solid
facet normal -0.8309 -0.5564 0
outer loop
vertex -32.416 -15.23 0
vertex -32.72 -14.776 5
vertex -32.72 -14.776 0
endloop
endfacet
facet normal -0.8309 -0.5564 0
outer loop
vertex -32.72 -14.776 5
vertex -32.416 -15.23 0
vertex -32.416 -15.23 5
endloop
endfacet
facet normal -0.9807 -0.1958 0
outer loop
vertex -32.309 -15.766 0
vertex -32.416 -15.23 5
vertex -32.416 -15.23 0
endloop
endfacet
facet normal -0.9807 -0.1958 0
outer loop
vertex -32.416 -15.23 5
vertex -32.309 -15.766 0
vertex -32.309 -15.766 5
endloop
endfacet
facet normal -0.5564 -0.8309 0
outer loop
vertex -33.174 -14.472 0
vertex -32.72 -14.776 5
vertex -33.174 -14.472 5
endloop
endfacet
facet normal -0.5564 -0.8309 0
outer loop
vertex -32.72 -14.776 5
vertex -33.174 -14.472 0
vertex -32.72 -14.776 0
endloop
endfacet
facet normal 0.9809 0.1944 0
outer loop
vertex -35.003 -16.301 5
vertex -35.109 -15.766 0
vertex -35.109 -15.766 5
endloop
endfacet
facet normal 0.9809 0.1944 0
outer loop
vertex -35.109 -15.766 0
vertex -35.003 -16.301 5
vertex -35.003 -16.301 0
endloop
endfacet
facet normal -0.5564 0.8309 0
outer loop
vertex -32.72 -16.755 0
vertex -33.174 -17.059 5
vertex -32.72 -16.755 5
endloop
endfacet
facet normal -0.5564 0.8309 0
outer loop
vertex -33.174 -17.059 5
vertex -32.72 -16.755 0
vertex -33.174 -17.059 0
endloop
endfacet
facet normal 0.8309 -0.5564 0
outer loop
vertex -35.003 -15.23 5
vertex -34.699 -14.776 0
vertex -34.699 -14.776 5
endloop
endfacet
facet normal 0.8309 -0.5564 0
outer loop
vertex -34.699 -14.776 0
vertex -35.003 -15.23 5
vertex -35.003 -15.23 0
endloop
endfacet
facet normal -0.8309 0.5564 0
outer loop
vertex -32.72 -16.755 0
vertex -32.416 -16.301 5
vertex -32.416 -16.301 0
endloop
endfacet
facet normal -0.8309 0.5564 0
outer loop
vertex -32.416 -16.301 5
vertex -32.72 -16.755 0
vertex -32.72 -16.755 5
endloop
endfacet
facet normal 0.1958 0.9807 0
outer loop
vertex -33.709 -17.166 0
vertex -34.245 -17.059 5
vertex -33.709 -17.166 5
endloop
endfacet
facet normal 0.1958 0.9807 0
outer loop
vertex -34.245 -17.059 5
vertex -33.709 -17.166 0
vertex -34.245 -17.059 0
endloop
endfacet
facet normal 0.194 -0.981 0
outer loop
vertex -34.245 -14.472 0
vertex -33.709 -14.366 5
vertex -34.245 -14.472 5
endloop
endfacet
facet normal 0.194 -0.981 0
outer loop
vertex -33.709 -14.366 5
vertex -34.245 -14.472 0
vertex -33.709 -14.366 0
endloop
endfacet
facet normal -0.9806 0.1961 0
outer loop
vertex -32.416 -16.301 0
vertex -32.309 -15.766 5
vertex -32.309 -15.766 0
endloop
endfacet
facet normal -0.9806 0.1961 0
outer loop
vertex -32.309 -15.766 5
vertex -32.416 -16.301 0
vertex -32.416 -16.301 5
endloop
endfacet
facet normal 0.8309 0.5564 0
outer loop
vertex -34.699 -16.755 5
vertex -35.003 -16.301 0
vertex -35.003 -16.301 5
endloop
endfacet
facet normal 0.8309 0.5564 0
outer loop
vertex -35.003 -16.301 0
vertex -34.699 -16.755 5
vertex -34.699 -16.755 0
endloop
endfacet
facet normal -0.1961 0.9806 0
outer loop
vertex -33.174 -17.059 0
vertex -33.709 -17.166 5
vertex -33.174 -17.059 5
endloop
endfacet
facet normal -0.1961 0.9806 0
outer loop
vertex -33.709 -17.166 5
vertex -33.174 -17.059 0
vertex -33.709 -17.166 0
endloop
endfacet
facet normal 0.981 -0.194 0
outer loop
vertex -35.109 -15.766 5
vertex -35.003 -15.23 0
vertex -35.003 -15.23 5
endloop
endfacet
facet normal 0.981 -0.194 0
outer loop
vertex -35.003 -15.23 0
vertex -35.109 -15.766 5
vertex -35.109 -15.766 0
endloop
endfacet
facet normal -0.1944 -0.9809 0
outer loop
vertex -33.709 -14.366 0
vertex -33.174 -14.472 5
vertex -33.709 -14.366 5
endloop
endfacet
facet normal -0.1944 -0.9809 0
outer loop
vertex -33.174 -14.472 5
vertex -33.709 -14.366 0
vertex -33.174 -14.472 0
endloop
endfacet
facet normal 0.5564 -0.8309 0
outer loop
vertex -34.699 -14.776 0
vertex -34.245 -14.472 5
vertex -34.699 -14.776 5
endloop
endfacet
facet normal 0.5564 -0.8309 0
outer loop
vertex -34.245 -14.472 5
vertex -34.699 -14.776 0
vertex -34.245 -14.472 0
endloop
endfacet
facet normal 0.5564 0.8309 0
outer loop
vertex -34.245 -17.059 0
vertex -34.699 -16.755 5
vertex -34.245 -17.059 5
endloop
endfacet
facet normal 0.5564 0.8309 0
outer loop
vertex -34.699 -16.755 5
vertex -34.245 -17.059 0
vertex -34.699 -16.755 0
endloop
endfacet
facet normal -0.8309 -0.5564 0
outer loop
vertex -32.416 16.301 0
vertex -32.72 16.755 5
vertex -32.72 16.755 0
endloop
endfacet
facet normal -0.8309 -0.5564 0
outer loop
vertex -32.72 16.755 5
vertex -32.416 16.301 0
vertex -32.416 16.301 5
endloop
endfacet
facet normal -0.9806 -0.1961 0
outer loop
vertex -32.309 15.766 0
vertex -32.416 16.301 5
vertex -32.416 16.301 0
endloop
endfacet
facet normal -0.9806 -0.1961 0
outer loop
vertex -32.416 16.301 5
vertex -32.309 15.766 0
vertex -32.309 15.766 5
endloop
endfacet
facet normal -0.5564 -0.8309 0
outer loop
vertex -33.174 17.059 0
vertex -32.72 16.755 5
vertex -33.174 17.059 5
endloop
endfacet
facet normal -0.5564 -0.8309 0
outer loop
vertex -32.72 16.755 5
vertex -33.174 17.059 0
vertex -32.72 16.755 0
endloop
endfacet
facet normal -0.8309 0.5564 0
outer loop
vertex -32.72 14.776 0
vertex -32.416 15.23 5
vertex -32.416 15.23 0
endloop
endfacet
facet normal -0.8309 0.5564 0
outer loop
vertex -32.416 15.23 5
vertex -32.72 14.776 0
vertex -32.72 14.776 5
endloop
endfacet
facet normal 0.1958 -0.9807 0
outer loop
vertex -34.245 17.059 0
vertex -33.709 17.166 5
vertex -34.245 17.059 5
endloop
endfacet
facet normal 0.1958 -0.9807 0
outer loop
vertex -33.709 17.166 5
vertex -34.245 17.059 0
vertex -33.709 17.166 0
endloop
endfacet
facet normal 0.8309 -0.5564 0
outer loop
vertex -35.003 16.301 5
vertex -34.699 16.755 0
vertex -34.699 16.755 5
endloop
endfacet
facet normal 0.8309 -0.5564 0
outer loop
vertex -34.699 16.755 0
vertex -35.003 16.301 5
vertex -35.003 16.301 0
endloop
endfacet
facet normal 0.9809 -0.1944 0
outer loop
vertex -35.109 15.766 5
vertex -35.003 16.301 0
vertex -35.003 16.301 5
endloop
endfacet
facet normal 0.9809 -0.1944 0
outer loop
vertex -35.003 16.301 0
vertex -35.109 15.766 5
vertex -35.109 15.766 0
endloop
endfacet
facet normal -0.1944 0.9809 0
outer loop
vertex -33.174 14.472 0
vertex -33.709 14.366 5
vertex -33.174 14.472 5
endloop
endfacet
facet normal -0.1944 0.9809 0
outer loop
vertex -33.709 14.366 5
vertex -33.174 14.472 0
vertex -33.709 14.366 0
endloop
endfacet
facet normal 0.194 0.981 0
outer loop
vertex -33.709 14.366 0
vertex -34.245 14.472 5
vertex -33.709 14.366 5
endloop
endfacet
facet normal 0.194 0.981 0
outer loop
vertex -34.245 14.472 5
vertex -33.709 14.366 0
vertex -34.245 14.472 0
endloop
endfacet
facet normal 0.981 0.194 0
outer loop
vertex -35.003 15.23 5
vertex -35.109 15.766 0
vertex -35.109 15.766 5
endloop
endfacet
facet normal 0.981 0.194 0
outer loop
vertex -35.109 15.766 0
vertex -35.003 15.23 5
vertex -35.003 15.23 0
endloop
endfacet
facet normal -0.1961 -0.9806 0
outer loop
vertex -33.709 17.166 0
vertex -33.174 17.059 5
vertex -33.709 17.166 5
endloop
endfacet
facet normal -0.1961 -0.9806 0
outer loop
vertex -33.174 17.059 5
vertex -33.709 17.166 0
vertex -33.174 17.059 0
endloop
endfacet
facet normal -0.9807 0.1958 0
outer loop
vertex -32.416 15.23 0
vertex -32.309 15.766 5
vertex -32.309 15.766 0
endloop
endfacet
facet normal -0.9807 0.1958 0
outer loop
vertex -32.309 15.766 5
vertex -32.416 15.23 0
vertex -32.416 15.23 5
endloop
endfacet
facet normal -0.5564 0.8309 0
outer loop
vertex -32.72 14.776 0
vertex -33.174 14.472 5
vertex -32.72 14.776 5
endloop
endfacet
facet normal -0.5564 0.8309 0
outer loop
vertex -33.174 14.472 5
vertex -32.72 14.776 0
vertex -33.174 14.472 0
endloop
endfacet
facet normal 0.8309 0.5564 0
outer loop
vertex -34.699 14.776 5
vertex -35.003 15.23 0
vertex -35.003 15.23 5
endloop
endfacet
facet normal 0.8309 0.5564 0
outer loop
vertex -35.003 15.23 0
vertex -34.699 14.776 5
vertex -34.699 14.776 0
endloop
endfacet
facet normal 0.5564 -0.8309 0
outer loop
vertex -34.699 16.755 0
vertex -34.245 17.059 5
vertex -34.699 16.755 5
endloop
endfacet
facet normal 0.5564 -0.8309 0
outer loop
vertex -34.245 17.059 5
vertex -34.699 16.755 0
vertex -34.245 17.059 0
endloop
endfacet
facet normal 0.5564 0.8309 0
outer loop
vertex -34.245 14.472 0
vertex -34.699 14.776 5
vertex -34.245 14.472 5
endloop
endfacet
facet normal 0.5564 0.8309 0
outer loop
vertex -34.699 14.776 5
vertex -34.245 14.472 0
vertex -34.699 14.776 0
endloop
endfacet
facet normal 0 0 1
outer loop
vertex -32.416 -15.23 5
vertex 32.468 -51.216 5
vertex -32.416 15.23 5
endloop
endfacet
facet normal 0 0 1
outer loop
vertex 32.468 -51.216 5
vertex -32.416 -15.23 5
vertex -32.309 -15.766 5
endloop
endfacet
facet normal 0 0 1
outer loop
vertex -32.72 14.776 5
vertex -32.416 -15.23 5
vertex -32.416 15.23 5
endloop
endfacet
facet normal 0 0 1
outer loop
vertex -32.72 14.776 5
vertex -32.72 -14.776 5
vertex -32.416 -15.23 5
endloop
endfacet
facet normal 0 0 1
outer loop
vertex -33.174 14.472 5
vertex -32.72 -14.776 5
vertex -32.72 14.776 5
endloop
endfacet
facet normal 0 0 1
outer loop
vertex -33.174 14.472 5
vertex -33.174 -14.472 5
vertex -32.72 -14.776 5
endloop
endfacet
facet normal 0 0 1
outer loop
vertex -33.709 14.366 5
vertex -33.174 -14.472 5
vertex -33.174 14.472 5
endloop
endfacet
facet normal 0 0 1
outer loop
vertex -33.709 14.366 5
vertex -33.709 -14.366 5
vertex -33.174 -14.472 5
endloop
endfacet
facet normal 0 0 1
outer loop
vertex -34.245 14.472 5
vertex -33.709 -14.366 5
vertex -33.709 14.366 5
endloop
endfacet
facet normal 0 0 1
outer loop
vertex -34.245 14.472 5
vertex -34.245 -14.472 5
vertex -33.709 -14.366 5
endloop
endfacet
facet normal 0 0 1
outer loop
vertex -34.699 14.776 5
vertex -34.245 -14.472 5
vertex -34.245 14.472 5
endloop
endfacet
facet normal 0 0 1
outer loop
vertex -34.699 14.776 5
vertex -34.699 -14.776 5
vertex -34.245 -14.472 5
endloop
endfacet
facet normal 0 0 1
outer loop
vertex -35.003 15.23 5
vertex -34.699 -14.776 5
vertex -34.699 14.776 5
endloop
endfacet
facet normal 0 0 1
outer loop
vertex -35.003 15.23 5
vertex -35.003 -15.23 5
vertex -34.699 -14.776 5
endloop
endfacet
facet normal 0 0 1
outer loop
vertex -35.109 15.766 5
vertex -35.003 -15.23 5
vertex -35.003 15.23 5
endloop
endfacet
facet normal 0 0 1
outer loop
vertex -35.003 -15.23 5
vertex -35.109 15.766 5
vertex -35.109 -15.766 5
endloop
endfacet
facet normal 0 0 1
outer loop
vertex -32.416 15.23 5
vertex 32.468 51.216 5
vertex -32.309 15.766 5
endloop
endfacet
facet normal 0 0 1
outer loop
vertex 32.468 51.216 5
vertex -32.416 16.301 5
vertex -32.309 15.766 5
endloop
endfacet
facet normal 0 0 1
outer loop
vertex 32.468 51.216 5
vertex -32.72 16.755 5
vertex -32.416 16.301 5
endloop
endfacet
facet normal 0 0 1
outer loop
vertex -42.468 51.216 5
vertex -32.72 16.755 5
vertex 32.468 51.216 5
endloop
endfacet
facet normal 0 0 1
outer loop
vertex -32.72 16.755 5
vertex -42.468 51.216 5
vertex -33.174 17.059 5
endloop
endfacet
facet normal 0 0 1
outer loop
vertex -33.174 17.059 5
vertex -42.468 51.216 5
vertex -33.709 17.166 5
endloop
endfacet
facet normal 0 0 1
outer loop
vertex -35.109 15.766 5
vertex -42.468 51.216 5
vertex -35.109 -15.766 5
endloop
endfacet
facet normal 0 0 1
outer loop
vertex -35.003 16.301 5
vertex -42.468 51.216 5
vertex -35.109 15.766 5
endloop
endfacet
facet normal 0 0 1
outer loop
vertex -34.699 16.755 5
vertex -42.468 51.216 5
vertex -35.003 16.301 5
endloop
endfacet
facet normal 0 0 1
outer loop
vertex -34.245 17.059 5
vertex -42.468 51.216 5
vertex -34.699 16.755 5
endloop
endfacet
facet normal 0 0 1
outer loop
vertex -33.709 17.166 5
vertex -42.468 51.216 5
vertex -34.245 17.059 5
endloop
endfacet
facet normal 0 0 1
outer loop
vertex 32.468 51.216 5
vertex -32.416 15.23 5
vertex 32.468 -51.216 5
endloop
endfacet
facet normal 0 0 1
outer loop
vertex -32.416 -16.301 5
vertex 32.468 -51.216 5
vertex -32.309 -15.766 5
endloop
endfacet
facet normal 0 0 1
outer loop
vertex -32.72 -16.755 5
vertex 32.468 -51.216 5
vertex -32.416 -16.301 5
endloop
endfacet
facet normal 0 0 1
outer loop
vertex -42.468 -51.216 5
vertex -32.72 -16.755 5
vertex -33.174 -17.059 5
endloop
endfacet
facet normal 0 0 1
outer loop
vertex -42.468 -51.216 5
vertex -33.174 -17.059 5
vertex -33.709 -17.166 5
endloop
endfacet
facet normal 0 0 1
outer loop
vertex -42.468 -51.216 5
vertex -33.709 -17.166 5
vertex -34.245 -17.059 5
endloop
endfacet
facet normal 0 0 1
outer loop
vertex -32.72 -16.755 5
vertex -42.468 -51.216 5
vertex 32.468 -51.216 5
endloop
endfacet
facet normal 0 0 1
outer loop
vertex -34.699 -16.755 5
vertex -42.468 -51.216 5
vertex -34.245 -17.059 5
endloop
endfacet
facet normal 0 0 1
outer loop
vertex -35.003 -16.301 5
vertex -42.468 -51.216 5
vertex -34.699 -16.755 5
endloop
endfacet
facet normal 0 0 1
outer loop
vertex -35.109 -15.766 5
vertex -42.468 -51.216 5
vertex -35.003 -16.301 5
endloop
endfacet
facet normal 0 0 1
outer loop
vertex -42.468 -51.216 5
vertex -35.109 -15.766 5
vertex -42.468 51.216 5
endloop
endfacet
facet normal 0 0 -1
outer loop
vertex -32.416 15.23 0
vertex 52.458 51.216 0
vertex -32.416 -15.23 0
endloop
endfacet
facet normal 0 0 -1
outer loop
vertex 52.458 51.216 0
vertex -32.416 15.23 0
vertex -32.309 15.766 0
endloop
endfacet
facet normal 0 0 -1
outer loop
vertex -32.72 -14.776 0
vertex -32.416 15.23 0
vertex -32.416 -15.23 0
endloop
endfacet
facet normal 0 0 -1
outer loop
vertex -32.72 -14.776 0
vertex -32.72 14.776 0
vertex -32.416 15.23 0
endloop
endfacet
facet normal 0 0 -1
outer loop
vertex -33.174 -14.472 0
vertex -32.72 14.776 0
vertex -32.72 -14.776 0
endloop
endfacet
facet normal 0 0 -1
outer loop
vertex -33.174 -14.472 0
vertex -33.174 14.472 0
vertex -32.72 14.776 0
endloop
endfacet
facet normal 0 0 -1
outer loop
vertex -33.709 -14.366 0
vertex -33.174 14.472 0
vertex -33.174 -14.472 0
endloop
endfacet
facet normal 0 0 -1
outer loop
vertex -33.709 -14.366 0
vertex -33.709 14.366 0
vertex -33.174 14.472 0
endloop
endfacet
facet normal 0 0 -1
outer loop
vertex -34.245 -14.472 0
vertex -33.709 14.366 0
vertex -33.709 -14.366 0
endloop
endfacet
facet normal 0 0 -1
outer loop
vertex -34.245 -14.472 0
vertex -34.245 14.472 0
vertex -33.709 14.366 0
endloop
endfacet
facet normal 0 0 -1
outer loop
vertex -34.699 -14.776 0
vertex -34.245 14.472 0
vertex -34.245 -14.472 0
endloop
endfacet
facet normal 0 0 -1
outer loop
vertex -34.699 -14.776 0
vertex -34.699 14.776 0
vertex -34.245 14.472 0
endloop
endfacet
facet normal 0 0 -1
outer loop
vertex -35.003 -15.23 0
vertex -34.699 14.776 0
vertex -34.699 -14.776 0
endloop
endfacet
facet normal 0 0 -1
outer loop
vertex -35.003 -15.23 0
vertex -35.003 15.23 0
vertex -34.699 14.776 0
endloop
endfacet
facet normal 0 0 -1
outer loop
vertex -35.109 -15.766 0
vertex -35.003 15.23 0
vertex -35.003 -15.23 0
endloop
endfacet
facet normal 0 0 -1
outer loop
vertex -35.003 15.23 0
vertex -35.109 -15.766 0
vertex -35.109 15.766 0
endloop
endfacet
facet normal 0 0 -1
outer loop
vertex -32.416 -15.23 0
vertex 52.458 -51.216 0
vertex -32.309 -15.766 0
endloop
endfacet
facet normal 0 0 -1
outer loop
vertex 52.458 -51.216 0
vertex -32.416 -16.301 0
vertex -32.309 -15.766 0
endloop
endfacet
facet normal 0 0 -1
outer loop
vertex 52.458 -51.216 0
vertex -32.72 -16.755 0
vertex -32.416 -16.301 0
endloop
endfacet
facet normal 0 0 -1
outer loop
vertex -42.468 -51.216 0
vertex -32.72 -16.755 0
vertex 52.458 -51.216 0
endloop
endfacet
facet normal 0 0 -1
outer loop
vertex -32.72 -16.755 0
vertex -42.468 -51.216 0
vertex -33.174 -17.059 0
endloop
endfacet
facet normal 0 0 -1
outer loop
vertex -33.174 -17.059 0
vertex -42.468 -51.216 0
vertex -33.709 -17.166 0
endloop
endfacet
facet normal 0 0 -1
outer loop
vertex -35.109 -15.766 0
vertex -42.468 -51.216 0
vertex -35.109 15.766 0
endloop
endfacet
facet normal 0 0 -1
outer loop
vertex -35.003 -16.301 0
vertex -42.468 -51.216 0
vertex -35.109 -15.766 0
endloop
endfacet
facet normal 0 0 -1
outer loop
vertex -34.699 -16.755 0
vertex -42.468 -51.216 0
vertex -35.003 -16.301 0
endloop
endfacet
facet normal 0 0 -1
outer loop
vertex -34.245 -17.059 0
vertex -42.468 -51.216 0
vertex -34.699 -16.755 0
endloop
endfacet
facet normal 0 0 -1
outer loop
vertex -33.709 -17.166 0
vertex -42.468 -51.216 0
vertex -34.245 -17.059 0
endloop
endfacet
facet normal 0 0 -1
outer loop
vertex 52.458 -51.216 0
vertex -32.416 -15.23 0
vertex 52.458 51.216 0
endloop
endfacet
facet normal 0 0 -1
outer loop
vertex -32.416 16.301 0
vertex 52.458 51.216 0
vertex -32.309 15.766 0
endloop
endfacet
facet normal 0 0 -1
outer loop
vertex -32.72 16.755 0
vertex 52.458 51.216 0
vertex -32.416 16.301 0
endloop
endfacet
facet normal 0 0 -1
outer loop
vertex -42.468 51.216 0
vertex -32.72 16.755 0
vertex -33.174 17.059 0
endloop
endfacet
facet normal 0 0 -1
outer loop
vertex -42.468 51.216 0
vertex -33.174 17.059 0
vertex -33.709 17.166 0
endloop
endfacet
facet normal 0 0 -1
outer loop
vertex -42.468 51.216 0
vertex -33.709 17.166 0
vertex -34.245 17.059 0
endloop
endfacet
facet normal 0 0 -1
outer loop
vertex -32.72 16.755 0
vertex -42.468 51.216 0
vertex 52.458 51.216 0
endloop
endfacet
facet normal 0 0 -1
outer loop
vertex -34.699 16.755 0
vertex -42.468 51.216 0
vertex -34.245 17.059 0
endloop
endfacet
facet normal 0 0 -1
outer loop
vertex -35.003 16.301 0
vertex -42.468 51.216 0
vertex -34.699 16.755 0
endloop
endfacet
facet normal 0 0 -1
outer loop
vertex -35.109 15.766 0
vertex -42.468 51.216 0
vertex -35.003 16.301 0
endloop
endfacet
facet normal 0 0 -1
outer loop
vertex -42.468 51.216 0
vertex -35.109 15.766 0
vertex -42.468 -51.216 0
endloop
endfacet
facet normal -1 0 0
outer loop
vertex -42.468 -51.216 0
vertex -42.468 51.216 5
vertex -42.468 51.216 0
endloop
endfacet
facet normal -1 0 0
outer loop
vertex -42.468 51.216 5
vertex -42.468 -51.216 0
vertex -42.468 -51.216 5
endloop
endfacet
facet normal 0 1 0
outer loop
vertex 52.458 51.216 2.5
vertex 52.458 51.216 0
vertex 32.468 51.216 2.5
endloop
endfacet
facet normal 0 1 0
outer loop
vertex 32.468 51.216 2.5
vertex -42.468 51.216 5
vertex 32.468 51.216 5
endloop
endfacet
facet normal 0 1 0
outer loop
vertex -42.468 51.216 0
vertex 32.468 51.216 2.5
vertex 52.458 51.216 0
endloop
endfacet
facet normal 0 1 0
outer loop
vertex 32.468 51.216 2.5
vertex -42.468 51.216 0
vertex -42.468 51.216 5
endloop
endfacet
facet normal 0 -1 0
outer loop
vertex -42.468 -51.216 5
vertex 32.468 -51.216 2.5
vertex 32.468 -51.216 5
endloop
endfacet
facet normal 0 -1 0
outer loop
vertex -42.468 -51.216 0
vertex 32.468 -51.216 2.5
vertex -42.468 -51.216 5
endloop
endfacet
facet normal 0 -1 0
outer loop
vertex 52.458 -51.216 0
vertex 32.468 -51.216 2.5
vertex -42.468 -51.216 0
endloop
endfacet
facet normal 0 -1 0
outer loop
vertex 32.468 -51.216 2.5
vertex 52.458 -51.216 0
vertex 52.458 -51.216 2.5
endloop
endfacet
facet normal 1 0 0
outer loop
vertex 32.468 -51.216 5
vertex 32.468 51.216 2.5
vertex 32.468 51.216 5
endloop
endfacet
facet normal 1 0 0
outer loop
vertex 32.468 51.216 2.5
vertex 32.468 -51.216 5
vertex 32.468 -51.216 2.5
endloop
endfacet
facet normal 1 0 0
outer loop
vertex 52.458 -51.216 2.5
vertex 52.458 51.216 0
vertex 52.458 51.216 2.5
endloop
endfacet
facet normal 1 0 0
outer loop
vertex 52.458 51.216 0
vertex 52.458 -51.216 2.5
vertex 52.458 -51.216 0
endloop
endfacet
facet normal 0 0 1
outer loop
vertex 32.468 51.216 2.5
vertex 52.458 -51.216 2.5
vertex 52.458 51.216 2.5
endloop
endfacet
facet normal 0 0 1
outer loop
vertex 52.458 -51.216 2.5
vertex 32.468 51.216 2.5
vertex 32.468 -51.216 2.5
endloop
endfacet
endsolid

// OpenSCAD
// file: ../../library/e7_all.scad
// ==========================================================================
//  e7_all.scad - include this one file. Preview, print plates and the report.
// ==========================================================================
include <e7_params.scad>
include <e7_body.scad>

// whole painted loco
module e7_preview() {
  // carbody in its paint bands
  for (i = [0:len(PAINT_BANDS) - 1]) {
    z0 = i == 0 ? -1 : p(PAINT_BANDS[i - 1][0]);
    z1 = i == len(PAINT_BANDS) - 1 ? 1000 : p(PAINT_BANDS[i][0]);
    color(PAINT_BANDS[i][1]) render(convexity = 8) e7_shell_solid([z0, z1]);
  }
  color(C_GLASS) e7_glass();
  color(C_LENS) let (d = nose_d_at_z(HEADLIGHT[0]))
    translate([XF - p(d) + p(HEADLIGHT[2]) + p(1.5), 0, p(HEADLIGHT[0])]) rotate([0, 90, 0]) cylinder(d = p(HEADLIGHT[1]) - 0.8, h = 0.5, $fn = 32);
  color(C_FRAME) { for (j = [1:NFRAME]) e7_frame_piece(j); e7_pilot(); e7_pilot_rear(); }
  for (tx = [TRK_X, -TRK_X]) translate([tx, 0, 0]) { color(C_TRUCK) e7_truck_frame(); color(C_WHEEL) e7_wheels(); }
}
// thin glass panes sitting in the window pockets (preview only)
module e7_glass() {
  intersection() { e7_loft(DET * 0.6); union() { e7_windshield_cut(); e7_side_cuts_windows_only(); } }
}
module e7_side_cuts_windows_only() {
  for (s = [-1, 1], w = CAB_WIN)
    translate([XF - p(w[1]), s * HW - (s > 0 ? DET : 3 - DET), p(w[2])]) cube([p(w[1] - w[0]), 3, p(w[3] - w[2])]);
}

// one print, laid out for the printer
module e7_plate(part) {
  sec = [for (k = [1:NSEC]) str("body_", k)];
  frm = [for (j = [1:NFRAME]) str("frame_", j)];
  if (is_num(search([part], sec)[0])) {
    k = search([part], sec)[0] + 1;
    // stand the section on its open bottom (skirt edge on the bed)
    translate([-sec_x0(k) - SEC_L / 2, 0, -Z_SKIRT]) e7_body_section(k);
  } else if (is_num(search([part], frm)[0])) {
    j = search([part], frm)[0] + 1;
    xs = concat([FRAME_X0], FRAME_SPLITS, [FRAME_X1]);
    translate([-(xs[j - 1] + xs[j]) / 2, 0, -Z_FRAME_BOT]) e7_frame_piece(j);
  } else if (part == "pilot") {
    translate([-XF, 0, 0]) rotate([0, 0, 0]) translate([0, 0, -p(5)]) e7_pilot();
  } else if (part == "pilot_rear") {
    translate([-XR, 0, 0]) translate([0, 0, -(CPL_Z - CPL_H / 2 - WALL)]) e7_pilot_rear();
  } else if (part == "truck") {
    // upside down, bolster on the bed
    translate([0, 0, Z_FRAME_BOT - 0.3]) rotate([180, 0, 0]) e7_truck_frame();
  } else {
    assert(false, str("unknown part '", part, "'"));
  }
}

module e7_report() {
  echo(str("MILW E7A ", ROAD_NO, " class ", CLASS, " - ", SC, " scale 1:", RATIO, ", paint ", PAINT));
  echo(str("  carbody ", round(BL), " mm long, ", round(2 * HW), " mm wide, roof ", round(Z_ROOF), " mm, cab ", round(Z_CAB), " mm above rail"));
  echo(str("  ", NSEC, " body sections of ", round(SEC_L), " mm; ", NFRAME, " frame pieces; trucks at +/- ", round(TRK_X), " mm"));
  echo(str("  body screws ", SCREW_BODY_NAME, " x ", 2 * len(BOSS_X), "; truck pivots ", PIVOT[1], "; wheels ", round(WHEEL_D * 10) / 10, " mm (bought)"));
}
// main file
// Milwaukee Road E7A, G scale 1-29 - print 5 of 12: frame_1 - frame plate piece 1 (rear; print flat)
// Render (F6), export STL, print. Settings: ../../library/e7_params.scad
// Whole loco preview and notes: ../../MILW_E7_Main.scad
SCALE_SEL = "G";
include <../../library/e7_all.scad>
e7_plate("frame_1");
